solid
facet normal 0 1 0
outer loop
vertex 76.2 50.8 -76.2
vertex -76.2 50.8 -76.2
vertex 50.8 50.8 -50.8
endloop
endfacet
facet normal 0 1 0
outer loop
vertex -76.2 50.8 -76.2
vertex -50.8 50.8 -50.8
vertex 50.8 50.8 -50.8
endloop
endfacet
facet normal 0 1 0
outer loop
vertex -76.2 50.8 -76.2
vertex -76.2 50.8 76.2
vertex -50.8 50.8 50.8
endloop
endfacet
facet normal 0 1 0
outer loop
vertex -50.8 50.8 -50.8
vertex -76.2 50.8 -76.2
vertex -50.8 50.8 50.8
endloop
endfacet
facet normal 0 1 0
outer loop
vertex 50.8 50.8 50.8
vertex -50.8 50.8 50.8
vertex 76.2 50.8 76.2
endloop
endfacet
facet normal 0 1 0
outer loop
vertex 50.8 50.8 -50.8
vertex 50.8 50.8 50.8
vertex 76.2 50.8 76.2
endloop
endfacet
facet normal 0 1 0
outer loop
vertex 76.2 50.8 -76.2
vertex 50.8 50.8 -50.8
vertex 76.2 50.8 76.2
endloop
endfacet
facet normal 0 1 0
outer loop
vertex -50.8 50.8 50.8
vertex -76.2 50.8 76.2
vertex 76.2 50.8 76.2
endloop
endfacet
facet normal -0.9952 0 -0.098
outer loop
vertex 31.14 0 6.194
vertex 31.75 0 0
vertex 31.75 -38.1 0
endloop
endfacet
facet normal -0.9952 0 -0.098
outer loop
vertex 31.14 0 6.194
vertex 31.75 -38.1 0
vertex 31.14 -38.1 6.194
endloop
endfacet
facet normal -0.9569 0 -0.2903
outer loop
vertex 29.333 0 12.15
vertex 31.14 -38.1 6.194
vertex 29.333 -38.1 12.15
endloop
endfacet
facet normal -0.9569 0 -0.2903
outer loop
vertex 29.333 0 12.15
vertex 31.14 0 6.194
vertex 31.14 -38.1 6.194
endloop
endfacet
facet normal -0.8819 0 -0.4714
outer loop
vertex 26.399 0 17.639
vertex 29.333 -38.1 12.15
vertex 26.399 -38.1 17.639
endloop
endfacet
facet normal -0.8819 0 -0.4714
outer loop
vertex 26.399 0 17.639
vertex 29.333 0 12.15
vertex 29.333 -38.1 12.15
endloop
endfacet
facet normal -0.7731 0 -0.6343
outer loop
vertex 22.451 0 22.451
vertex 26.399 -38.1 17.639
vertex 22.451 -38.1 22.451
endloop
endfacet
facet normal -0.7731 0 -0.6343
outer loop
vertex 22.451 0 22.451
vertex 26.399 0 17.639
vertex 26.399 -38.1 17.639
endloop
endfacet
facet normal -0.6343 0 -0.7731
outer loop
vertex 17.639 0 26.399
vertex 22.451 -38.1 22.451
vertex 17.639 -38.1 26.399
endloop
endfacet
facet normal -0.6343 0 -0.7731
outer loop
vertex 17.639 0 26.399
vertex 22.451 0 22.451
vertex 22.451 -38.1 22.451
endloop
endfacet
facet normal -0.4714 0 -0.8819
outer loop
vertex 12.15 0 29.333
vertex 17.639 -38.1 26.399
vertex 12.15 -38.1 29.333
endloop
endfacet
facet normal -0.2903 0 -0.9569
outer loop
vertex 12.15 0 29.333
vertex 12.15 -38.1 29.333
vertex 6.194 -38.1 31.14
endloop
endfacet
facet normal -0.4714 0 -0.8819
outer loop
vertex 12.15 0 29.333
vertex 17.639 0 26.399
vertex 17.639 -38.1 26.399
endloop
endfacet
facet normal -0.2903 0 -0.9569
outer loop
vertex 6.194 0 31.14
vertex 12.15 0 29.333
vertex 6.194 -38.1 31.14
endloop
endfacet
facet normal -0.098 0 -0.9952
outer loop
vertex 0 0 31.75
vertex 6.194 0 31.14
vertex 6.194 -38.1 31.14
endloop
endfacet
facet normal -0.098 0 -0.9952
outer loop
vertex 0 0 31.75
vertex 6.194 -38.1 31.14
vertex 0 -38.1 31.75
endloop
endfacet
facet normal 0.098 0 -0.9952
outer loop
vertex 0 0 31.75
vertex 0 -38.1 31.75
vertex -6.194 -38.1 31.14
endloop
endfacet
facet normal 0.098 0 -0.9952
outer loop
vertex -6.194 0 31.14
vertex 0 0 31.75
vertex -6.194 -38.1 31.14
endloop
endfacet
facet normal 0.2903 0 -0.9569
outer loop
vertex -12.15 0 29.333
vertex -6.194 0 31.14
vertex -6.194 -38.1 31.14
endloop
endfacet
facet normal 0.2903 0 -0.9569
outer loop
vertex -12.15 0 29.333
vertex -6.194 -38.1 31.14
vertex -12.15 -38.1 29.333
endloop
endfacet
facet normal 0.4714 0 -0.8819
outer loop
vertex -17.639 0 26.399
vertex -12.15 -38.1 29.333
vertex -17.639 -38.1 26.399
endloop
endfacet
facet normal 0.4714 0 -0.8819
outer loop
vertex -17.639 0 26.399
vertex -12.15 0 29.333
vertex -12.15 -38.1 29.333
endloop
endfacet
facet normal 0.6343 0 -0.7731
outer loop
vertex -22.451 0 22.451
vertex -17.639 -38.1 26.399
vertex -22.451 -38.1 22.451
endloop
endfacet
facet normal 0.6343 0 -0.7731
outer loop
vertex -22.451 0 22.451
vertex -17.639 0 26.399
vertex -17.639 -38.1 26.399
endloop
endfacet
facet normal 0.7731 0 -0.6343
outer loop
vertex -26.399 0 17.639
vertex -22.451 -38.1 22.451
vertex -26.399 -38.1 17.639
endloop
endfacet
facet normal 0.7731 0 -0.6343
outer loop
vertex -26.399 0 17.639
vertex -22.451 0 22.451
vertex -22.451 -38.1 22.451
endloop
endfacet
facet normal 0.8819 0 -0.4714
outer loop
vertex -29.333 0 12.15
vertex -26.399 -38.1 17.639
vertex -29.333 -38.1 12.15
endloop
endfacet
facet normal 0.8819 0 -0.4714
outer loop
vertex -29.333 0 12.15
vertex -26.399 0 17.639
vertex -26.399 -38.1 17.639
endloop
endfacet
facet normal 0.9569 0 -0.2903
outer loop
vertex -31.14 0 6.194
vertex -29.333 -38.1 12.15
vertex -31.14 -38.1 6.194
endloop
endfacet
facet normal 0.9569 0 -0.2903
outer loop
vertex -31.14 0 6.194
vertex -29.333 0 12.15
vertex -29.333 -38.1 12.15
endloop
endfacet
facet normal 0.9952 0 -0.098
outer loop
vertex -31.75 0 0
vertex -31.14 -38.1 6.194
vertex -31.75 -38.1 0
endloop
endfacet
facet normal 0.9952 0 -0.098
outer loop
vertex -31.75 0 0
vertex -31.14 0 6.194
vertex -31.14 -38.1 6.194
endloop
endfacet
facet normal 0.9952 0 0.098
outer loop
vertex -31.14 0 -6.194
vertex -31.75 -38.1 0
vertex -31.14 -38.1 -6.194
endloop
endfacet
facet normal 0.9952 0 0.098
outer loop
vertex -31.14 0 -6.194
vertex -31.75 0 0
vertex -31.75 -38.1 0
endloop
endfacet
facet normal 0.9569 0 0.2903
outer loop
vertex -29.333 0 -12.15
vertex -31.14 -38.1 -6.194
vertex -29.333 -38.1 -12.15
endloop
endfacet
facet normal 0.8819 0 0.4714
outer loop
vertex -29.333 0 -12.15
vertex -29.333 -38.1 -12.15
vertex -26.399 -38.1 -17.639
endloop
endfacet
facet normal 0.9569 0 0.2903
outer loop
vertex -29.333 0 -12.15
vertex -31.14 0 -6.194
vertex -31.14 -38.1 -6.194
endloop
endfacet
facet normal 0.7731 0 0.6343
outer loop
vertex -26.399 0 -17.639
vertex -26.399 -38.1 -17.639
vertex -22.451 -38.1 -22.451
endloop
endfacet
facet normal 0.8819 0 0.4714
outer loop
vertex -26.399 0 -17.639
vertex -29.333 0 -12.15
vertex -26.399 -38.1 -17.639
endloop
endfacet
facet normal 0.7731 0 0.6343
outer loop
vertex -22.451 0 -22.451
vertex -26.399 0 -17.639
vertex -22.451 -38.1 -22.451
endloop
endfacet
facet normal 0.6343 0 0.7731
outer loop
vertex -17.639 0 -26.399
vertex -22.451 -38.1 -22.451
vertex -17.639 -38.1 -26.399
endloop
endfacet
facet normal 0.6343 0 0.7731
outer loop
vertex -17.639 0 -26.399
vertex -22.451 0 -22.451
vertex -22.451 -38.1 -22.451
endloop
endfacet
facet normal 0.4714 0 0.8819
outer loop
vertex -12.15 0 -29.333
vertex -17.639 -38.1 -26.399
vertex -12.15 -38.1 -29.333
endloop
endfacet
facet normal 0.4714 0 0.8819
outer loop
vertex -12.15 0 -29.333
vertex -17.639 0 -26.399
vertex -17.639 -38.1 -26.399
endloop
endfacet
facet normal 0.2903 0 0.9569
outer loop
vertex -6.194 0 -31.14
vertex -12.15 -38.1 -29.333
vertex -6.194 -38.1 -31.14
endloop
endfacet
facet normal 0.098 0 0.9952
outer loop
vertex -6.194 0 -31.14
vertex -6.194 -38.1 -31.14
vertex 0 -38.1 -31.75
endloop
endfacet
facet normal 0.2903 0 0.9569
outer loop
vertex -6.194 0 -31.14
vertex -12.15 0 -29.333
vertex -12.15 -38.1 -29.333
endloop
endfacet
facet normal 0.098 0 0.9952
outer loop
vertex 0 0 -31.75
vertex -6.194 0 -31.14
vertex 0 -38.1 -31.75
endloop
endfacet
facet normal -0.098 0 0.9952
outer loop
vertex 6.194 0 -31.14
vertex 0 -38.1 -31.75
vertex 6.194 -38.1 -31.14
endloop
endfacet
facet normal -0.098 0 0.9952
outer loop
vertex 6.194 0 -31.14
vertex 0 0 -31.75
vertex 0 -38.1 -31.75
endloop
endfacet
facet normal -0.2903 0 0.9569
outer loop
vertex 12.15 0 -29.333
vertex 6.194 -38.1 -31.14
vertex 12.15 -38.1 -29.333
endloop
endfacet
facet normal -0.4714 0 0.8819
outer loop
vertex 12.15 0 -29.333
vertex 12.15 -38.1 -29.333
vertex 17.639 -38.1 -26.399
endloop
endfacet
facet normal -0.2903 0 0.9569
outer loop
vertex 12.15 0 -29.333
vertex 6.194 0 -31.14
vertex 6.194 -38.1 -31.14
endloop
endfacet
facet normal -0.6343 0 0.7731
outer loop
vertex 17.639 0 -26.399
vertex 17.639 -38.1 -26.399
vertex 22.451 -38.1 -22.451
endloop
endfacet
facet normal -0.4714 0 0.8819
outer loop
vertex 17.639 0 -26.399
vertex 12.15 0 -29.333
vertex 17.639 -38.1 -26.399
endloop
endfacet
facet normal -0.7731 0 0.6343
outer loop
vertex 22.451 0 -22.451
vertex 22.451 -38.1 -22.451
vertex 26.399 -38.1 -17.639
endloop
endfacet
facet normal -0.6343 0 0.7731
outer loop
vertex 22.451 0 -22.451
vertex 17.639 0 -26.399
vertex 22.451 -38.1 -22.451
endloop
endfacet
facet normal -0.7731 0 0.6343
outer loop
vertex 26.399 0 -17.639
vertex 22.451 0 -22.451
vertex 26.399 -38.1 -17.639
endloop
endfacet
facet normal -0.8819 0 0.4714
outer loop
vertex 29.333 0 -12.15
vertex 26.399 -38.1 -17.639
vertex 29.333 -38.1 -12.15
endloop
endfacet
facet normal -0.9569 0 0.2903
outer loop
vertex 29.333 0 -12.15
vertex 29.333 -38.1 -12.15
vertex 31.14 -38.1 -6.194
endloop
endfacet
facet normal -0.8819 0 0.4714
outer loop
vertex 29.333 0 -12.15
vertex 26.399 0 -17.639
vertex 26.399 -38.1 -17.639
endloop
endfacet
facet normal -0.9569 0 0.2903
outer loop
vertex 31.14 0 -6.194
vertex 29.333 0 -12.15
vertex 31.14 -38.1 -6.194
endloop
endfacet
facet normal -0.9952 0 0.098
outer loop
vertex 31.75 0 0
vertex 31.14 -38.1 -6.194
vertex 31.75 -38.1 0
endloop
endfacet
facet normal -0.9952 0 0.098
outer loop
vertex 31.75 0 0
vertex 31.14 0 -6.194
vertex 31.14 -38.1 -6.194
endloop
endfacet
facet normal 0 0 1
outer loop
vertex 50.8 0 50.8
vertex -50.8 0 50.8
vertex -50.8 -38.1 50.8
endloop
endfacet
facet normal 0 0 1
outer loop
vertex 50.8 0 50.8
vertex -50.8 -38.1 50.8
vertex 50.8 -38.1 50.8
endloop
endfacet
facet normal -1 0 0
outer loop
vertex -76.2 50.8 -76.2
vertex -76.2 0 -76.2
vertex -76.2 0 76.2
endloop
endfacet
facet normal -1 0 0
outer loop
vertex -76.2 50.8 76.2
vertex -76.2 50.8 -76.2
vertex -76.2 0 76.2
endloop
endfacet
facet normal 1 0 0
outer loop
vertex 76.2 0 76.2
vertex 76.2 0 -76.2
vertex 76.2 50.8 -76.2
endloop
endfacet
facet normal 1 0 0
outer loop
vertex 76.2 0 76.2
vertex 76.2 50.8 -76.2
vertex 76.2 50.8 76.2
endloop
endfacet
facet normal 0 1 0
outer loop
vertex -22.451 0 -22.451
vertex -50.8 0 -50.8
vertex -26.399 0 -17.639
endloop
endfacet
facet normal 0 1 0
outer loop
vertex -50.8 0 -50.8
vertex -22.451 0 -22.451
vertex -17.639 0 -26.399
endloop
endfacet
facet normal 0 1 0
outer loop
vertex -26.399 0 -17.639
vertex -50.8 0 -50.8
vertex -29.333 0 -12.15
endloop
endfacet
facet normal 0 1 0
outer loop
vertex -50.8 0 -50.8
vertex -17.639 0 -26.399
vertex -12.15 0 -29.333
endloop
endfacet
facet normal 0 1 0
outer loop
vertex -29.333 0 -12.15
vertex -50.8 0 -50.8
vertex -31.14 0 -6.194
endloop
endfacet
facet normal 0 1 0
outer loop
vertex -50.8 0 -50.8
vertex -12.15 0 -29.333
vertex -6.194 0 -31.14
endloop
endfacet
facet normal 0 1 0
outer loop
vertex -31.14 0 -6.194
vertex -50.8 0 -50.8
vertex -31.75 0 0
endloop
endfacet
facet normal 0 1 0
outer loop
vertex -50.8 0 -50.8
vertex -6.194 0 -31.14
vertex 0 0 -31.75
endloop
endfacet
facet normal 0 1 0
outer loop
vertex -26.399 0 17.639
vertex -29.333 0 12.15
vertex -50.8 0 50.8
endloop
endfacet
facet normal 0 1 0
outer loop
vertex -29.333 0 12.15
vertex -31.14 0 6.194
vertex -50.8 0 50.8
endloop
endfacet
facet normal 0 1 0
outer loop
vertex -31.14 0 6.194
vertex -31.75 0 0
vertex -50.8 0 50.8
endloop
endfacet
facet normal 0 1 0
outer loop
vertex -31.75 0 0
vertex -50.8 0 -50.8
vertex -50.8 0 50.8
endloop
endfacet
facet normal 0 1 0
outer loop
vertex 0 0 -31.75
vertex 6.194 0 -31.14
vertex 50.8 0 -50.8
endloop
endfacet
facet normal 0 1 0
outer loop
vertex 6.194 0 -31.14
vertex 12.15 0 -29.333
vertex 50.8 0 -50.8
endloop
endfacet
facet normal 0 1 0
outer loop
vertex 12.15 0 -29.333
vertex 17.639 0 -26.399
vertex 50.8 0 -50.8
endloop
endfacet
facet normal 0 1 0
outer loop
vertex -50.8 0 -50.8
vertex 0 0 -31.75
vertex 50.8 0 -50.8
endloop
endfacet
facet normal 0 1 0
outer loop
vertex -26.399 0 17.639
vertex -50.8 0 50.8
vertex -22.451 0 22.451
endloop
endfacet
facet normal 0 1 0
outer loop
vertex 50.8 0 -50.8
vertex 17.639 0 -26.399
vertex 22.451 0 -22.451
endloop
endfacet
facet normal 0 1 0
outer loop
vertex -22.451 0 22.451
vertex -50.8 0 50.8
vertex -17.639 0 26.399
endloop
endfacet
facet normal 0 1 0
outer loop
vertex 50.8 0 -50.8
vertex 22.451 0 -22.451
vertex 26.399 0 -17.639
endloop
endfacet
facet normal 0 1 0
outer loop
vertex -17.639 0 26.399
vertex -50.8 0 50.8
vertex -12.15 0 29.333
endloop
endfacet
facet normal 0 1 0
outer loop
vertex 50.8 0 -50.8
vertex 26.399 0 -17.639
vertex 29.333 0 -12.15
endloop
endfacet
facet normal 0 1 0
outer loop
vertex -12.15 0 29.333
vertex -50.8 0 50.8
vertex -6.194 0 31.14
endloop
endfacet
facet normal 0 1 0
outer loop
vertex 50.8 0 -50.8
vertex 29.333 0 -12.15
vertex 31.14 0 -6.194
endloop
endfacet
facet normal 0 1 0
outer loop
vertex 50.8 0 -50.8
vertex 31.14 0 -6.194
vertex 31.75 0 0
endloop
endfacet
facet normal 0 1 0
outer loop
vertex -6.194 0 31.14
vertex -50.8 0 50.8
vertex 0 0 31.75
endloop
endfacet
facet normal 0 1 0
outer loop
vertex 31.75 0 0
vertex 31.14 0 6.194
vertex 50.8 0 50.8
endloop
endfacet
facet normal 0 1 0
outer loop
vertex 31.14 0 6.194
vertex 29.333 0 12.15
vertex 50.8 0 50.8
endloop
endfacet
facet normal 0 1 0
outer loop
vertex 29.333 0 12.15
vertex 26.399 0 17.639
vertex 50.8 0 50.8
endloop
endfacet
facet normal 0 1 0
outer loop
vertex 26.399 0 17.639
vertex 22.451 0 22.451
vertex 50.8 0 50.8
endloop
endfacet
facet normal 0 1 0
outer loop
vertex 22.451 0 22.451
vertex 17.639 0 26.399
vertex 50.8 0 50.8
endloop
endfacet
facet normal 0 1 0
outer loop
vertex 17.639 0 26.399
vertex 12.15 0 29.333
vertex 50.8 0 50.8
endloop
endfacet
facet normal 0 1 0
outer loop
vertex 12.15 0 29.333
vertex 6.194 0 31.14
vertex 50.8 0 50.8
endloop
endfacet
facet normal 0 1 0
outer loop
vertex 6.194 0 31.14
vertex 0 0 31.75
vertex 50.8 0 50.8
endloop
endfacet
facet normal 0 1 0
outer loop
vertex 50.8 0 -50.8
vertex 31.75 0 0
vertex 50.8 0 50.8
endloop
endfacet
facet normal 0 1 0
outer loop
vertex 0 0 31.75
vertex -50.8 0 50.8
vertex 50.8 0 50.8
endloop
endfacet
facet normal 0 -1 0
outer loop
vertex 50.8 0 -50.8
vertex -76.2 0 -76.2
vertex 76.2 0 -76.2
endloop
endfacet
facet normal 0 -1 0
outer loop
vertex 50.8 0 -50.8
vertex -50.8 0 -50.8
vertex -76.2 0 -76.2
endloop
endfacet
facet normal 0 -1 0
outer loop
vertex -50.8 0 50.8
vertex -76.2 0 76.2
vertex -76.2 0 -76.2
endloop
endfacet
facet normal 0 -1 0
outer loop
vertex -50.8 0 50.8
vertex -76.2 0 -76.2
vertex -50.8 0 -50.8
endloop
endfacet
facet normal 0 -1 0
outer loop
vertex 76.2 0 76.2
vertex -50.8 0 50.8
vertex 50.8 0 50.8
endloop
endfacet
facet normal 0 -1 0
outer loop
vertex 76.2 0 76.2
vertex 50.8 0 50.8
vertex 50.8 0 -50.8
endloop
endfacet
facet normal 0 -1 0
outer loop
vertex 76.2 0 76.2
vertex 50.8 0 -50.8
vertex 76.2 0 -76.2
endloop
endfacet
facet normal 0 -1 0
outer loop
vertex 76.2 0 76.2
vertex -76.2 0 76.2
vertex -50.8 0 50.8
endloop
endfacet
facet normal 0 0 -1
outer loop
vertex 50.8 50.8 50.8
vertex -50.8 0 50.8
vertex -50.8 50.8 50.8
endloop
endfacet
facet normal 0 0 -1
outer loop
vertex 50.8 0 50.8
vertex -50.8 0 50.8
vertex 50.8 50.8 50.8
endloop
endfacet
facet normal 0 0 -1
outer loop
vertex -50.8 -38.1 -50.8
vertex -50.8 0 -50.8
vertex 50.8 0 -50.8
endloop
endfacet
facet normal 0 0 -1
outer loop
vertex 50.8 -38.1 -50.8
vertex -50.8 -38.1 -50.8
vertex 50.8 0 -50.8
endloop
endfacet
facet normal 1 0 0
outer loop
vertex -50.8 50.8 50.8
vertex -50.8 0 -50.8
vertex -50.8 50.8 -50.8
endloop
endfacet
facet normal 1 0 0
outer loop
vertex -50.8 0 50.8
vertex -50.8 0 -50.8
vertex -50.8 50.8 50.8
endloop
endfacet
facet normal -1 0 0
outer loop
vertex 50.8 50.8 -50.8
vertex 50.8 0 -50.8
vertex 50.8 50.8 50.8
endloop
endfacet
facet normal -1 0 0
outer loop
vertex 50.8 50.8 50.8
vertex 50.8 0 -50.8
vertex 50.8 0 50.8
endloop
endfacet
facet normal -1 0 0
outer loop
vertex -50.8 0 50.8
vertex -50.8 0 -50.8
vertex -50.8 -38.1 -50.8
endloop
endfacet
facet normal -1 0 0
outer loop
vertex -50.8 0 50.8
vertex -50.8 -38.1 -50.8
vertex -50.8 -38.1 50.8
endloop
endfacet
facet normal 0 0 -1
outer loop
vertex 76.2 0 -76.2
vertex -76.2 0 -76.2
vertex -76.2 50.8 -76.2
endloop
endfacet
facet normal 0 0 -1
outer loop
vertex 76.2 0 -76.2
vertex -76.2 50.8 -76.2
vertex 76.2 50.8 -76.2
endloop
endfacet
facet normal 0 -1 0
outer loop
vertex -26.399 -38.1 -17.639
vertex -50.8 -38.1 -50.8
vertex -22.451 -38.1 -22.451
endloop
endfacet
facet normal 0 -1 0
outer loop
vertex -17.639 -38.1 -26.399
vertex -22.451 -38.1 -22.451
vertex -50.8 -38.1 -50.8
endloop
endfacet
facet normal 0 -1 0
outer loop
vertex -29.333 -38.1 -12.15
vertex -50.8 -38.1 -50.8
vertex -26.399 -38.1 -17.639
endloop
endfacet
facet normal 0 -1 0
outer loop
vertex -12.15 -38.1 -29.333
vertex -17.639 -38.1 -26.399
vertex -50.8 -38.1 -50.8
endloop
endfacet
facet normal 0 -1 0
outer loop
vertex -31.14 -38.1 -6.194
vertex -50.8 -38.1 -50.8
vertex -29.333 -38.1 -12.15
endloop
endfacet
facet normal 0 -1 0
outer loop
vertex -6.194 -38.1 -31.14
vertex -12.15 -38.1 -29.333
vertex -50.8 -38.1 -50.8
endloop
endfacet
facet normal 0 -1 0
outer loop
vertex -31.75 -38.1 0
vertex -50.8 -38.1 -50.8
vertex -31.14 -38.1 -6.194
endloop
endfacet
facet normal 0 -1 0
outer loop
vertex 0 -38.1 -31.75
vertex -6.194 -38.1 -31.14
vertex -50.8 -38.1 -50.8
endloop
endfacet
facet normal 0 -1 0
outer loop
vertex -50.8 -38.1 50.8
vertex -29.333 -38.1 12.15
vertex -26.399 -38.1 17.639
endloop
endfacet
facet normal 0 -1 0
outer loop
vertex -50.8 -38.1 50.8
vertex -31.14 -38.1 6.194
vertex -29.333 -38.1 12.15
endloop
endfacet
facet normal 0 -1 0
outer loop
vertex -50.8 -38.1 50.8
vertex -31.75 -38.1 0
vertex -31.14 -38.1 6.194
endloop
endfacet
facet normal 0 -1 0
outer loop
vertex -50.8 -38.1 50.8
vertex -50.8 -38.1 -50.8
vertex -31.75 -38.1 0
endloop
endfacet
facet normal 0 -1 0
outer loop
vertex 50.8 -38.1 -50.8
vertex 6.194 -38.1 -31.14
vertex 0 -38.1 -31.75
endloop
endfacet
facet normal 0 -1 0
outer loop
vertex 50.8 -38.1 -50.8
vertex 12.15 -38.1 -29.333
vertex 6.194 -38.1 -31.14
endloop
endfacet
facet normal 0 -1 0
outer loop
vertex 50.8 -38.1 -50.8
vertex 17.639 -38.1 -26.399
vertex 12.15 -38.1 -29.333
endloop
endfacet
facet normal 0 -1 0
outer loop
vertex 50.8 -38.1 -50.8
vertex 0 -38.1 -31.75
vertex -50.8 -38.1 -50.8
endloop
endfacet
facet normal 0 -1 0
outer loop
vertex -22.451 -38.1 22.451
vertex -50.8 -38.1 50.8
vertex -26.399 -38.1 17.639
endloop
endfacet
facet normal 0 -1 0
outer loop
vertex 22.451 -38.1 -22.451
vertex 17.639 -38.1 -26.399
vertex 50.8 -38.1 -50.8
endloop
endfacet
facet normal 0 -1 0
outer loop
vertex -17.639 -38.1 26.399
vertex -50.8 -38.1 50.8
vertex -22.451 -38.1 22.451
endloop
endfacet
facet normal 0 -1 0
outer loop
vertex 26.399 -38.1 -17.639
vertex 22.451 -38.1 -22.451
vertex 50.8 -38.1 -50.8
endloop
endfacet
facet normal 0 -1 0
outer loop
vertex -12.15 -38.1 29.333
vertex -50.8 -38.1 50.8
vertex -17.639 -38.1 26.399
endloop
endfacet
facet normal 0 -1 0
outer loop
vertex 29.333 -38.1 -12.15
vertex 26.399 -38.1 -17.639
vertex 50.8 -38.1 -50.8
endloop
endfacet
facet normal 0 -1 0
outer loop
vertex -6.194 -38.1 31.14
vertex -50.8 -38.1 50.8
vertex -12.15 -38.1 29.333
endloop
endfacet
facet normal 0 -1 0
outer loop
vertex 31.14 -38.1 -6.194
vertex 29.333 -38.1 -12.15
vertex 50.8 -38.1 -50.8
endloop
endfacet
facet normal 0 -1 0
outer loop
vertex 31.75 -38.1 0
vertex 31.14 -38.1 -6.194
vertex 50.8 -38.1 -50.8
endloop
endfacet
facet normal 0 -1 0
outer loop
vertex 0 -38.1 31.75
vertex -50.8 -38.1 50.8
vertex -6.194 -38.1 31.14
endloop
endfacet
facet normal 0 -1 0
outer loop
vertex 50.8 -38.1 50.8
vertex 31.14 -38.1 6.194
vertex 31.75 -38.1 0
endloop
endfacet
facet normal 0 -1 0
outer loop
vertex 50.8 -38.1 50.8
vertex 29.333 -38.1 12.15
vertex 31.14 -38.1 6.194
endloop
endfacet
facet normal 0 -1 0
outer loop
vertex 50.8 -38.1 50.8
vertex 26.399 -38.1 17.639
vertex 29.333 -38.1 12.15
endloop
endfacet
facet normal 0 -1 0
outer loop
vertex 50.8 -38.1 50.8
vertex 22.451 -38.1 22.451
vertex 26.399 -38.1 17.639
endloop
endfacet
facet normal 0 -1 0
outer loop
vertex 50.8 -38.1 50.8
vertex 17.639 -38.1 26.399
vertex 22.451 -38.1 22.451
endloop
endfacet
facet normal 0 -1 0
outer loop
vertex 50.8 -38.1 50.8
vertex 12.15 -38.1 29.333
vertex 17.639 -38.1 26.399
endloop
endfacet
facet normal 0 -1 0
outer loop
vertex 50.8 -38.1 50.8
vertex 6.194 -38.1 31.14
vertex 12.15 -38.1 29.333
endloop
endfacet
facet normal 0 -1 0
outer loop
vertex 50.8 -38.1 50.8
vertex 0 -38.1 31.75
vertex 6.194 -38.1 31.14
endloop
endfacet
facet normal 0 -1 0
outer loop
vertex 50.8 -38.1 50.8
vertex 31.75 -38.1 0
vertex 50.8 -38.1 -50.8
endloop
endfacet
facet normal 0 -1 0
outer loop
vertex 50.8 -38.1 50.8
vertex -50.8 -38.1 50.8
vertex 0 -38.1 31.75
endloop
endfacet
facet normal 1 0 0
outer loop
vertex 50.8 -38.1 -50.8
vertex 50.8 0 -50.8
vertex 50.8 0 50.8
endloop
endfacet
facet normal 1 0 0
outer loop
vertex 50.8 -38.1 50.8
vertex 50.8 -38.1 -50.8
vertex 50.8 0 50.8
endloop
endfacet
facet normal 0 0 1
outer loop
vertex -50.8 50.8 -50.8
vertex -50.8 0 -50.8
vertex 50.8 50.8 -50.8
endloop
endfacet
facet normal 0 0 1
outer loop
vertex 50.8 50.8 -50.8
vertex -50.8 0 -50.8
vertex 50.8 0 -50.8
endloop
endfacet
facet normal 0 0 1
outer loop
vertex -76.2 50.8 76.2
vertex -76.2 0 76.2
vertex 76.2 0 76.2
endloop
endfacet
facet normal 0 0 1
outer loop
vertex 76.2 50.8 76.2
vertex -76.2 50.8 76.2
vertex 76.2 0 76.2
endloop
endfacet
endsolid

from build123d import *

# Parameters (mm, degrees)
F0_W     = 101.6
F0_H     = 101.6
F0_R     = 31.75
F1_DEPTH = 38.1
F0_W_2   = 152.4
F0_H_2   = 152.4
F2_DEPTH = 50.8


with BuildPart() as f1:
    # F0 (on Front) → F1 (new body)
    with BuildSketch(Plane.XZ):
        Rectangle(F0_W, F0_H)
        Circle(F0_R, mode=Mode.SUBTRACT)
    extrude(amount=F1_DEPTH)


with BuildPart() as f2:
    # F0 (on Front) → F2 (new body)
    with BuildSketch(Plane.XZ):
        Rectangle(F0_W_2, F0_H_2)
        Rectangle(F0_W, F0_H, mode=Mode.SUBTRACT)
    extrude(amount=-F2_DEPTH)


solid = Compound([f1.part, f2.part])
